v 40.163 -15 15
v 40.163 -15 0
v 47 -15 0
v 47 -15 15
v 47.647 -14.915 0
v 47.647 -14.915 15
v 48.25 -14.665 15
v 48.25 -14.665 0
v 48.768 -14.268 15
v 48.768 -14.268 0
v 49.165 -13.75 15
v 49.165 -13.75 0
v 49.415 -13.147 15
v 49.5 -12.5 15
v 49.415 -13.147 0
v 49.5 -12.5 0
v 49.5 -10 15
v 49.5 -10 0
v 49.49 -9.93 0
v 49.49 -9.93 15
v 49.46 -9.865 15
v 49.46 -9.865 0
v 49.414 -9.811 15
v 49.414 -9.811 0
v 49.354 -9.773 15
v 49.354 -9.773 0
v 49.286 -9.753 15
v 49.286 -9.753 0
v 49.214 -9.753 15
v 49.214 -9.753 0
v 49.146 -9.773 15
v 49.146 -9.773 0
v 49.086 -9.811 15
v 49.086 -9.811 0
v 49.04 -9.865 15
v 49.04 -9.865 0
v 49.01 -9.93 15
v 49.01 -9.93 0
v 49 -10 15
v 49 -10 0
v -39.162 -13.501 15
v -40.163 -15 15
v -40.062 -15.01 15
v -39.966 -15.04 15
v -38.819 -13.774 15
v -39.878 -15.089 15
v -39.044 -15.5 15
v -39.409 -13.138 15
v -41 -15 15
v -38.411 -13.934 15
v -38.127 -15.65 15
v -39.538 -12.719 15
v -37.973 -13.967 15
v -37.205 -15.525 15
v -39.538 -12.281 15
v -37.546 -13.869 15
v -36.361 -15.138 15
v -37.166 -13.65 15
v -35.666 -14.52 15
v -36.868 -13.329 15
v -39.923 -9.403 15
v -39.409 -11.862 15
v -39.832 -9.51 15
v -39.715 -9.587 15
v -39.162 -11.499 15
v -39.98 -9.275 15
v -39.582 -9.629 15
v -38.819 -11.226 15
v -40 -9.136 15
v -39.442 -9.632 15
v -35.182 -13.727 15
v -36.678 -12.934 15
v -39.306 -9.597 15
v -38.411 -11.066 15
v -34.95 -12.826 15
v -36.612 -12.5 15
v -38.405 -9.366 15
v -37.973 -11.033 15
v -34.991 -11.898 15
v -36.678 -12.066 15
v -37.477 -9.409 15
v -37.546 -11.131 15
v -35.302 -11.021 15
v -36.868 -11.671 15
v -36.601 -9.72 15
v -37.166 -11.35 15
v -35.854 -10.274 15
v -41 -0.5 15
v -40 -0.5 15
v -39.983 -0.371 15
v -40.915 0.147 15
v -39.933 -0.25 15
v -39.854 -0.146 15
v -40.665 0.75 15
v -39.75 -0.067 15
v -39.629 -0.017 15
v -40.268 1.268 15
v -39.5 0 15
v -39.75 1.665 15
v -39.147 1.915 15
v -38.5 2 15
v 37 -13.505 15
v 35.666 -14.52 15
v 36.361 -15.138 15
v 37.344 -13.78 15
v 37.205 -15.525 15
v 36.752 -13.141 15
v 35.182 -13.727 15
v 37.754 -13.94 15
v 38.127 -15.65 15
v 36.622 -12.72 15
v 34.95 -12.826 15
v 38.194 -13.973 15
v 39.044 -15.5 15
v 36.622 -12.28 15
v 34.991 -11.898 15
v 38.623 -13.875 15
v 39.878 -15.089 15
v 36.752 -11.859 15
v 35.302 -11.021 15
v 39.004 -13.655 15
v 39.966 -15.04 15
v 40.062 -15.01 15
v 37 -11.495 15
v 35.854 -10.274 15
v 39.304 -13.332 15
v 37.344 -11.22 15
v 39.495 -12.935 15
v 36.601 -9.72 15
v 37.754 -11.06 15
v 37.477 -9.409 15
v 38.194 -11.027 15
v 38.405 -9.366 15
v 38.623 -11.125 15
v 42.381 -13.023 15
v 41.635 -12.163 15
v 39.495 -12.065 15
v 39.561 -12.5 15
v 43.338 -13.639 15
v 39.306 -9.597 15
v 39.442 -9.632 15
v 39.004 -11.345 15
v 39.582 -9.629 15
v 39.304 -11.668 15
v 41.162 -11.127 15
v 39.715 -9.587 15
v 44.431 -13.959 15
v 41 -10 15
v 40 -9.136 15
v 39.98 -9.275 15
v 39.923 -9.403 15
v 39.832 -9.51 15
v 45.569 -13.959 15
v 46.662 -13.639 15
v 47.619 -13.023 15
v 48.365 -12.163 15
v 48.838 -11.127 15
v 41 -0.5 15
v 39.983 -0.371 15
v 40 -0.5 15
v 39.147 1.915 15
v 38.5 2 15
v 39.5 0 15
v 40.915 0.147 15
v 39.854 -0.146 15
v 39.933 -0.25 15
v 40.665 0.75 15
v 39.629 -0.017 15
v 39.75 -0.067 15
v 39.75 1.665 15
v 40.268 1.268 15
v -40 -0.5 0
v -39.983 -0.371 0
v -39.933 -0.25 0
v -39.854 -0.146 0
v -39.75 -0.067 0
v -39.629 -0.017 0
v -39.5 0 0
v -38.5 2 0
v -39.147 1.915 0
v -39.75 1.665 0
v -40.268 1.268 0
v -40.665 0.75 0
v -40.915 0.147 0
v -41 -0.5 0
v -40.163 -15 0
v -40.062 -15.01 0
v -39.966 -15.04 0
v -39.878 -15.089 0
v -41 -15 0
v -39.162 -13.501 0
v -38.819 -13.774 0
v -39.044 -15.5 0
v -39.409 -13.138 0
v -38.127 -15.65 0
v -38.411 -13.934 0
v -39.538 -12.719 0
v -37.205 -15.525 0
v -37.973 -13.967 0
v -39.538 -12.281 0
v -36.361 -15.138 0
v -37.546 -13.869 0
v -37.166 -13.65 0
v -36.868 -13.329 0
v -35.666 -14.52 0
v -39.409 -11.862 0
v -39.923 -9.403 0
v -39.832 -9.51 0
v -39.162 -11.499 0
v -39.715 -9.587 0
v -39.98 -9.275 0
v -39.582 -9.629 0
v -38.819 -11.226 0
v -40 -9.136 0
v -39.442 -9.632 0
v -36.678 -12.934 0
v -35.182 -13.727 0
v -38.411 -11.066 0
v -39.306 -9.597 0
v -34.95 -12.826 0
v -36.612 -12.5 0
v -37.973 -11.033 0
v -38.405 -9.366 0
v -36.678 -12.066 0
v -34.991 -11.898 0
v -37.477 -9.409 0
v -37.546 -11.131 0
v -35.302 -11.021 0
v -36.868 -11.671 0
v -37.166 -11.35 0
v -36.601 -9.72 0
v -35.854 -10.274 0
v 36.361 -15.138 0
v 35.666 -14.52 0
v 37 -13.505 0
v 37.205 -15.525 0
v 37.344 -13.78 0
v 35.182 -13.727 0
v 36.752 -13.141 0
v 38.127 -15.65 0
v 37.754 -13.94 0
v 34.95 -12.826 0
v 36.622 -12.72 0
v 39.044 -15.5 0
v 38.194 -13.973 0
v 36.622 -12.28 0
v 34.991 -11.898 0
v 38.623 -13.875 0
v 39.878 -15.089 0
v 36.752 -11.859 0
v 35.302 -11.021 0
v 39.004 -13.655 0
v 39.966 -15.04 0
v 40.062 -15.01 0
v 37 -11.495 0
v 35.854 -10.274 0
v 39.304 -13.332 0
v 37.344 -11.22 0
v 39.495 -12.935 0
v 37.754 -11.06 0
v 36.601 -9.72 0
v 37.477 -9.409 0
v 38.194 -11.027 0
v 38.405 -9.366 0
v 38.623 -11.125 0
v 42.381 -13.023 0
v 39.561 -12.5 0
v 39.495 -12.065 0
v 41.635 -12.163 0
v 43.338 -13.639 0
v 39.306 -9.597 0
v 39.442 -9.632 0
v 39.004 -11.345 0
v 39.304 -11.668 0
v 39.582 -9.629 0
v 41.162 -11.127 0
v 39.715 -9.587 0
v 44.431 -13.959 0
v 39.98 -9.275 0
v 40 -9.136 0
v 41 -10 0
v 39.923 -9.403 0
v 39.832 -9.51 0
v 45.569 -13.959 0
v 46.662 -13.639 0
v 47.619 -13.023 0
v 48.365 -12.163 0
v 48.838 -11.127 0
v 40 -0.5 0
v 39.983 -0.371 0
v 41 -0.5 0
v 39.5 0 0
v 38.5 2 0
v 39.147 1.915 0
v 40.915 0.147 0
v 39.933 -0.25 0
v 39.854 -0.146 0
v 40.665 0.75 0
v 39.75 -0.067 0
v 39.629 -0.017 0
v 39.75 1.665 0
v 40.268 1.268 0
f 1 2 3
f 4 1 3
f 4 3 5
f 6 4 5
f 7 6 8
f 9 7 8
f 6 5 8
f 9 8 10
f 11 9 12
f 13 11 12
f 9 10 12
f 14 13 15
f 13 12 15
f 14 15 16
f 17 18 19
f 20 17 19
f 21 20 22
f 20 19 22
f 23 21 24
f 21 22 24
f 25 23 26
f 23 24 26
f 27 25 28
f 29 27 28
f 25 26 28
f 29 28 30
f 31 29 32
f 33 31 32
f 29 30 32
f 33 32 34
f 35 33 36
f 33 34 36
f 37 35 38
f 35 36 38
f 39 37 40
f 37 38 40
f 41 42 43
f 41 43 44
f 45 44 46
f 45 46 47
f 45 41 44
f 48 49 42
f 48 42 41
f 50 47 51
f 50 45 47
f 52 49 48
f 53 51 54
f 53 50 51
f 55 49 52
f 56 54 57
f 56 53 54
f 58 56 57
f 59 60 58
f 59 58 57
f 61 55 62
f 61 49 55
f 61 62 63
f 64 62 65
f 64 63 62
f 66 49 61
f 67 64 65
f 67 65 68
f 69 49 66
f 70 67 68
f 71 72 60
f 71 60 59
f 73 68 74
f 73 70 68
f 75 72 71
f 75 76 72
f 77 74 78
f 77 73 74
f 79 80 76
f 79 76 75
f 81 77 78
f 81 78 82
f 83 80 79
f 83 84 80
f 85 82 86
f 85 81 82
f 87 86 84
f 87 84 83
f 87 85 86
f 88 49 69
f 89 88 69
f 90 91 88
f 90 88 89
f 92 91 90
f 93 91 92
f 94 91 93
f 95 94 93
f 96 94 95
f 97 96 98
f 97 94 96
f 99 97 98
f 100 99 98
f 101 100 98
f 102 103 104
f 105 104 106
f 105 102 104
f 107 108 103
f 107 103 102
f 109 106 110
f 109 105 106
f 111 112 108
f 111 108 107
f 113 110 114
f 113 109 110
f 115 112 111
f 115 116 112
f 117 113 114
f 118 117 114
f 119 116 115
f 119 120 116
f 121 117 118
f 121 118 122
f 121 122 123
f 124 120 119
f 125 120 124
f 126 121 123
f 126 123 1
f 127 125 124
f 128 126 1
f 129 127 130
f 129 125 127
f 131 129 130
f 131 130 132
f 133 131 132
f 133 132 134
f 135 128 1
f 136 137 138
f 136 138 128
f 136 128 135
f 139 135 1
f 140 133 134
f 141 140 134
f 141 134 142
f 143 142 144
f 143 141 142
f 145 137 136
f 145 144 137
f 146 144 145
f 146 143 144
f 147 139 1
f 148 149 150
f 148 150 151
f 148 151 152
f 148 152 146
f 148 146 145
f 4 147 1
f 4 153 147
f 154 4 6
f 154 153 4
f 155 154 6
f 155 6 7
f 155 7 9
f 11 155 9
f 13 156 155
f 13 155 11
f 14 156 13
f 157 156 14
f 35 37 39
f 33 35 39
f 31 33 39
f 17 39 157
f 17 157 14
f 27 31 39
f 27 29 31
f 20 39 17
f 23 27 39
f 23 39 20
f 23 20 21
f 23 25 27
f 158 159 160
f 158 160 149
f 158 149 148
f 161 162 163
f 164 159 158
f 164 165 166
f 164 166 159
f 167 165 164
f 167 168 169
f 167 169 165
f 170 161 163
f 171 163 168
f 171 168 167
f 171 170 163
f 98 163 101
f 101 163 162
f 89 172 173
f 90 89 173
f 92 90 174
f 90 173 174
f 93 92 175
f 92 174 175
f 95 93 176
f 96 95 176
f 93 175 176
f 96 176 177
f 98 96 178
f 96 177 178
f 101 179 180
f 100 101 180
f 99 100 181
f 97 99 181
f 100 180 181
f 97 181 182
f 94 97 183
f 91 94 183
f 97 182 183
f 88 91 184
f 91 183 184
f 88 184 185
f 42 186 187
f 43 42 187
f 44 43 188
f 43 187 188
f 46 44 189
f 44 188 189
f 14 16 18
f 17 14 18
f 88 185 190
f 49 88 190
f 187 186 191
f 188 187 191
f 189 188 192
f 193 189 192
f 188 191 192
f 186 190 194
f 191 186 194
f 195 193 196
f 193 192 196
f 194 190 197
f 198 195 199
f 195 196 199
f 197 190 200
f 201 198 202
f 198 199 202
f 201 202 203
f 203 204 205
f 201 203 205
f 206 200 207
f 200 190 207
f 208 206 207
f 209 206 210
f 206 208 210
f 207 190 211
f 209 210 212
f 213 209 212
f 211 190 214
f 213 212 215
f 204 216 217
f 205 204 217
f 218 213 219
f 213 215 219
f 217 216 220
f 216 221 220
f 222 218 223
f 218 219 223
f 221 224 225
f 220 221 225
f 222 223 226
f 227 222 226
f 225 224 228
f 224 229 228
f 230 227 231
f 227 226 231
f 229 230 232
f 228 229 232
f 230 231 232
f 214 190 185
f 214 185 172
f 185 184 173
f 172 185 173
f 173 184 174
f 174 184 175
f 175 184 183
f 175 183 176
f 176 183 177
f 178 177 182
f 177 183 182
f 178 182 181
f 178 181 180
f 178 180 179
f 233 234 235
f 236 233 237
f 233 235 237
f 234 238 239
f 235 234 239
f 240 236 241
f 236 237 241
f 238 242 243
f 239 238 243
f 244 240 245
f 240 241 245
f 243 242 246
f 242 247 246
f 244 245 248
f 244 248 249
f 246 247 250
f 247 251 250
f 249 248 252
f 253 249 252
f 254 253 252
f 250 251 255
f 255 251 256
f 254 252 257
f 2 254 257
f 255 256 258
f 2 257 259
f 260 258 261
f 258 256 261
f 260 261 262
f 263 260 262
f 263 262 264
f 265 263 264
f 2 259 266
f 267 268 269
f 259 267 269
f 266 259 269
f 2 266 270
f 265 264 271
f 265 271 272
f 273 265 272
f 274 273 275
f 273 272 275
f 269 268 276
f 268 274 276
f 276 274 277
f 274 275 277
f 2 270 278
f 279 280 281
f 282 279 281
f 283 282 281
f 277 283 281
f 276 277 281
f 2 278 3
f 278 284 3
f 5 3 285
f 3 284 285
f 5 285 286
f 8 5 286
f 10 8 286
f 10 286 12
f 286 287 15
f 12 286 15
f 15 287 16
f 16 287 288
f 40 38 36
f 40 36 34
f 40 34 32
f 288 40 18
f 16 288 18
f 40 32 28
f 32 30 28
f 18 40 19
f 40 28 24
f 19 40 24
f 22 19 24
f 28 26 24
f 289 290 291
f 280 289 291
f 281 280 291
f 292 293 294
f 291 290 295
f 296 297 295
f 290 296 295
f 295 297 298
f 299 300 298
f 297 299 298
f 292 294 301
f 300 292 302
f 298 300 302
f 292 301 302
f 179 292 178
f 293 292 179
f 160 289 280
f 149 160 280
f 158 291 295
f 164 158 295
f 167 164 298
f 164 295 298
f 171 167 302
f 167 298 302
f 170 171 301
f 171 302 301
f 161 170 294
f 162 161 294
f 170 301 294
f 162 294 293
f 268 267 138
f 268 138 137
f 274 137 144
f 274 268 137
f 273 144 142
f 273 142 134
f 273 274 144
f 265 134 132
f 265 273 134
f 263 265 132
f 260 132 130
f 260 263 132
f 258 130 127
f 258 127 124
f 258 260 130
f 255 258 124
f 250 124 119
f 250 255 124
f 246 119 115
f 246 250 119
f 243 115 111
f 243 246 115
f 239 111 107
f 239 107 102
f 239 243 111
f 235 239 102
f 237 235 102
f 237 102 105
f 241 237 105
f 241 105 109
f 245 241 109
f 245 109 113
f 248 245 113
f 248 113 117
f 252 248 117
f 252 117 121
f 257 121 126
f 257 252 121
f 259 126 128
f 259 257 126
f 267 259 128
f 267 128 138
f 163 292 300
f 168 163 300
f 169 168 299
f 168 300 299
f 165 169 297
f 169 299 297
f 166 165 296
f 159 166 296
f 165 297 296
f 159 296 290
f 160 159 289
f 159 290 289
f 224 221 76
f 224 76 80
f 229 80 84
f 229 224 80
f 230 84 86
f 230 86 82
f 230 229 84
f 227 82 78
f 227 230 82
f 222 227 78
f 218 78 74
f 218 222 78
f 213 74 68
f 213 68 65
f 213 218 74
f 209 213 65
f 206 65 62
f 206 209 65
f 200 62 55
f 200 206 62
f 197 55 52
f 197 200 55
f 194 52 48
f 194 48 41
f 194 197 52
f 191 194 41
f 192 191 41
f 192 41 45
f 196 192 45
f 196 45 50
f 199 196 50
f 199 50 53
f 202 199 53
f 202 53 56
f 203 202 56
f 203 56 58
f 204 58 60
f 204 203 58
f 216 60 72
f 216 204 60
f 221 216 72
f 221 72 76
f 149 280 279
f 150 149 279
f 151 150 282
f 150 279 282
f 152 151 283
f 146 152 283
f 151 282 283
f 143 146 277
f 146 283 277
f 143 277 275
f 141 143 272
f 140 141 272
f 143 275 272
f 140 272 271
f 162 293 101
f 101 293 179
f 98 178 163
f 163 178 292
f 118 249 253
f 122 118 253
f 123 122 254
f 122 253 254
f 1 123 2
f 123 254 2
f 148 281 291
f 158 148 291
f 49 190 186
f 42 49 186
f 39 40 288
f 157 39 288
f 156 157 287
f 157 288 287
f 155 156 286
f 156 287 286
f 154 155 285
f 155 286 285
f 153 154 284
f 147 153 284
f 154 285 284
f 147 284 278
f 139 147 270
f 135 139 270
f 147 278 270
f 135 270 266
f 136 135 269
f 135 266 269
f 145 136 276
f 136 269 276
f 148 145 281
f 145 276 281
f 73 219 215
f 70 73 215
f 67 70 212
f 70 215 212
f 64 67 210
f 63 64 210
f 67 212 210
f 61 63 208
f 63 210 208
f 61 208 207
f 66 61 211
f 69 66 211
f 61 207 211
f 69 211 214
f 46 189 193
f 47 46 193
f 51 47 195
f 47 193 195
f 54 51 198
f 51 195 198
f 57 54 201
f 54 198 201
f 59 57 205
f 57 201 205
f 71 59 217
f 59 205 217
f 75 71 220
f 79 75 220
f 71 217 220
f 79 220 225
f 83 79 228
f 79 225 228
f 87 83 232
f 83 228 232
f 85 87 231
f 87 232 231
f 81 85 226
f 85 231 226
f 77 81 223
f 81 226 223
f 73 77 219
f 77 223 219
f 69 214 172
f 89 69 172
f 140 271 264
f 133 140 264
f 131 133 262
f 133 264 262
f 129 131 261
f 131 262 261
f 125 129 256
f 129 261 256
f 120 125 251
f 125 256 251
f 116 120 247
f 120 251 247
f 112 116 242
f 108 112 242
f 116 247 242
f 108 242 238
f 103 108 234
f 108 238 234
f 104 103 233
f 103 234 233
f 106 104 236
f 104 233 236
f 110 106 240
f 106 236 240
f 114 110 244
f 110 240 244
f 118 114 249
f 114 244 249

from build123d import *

# Parameters (mm, degrees)
F0_R     = 1.477487
F0_R_2   = 1.471046
F1_DEPTH = 15


with BuildPart() as f1:
    # F0 (on Top) → F1 (new body)
    with BuildSketch(Plane.XY):
        with BuildLine():
            Line((0, 2), (0, 0))
            Line((0, 0), (39.5, 0))
            ThreePointArc((39.5, 0), (39.853553, -0.146447), (40, -0.5))
            Line((40, -0.5), (40, -9.135922))
            ThreePointArc((40, -9.135922), (39.776556, -9.552475), (39.305934, -9.596724))
            ThreePointArc((39.305934, -9.596724), (34.949923, -12.826281), (39.87787, -15.089068))
            ThreePointArc((39.87787, -15.089068), (40.013491, -15.022786), (40.162713, -15))
            Line((40.162713, -15), (45, -15))
            Line((45, -15), (47, -15))
            ThreePointArc((47, -15), (48.767767, -14.267767), (49.5, -12.5))
            Line((49.5, -12.5), (49.5, -10))
            ThreePointArc((49.5, -10), (49.25, -9.75), (49, -10))
            ThreePointArc((49, -10), (45, -14), (41, -10))
            Line((41, -10), (41, -2.565671))
            Line((41, -2.565671), (41, -0.5))
            ThreePointArc((41, -0.5), (40.267767, 1.267767), (38.5, 2))
            Line((38.5, 2), (0, 2))
        make_face()
        with Locations((38.083223, -12.5)):
            Circle(F0_R, mode=Mode.SUBTRACT)
        with BuildLine():
            Line((-39.5, 0), (0, 0))
            Line((0, 0), (0, 2))
            Line((0, 2), (-38.5, 2))
            ThreePointArc((-38.5, 2), (-40.267767, 1.267767), (-41, -0.5))
            Line((-41, -0.5), (-41, -15))
            Line((-41, -15), (-40.162713, -15))
            ThreePointArc((-40.162713, -15), (-40.013491, -15.022786), (-39.87787, -15.089068))
            ThreePointArc((-39.87787, -15.089068), (-34.949923, -12.826281), (-39.305934, -9.596724))
            ThreePointArc((-39.305934, -9.596724), (-39.776556, -9.552475), (-40, -9.135922))
            Line((-40, -9.135922), (-40, -0.5))
            ThreePointArc((-40, -0.5), (-39.853553, -0.146447), (-39.5, 0))
        make_face()
        with Locations((-38.083223, -12.5)):
            Circle(F0_R_2, mode=Mode.SUBTRACT)
    extrude(amount=F1_DEPTH)


solid = f1.part
